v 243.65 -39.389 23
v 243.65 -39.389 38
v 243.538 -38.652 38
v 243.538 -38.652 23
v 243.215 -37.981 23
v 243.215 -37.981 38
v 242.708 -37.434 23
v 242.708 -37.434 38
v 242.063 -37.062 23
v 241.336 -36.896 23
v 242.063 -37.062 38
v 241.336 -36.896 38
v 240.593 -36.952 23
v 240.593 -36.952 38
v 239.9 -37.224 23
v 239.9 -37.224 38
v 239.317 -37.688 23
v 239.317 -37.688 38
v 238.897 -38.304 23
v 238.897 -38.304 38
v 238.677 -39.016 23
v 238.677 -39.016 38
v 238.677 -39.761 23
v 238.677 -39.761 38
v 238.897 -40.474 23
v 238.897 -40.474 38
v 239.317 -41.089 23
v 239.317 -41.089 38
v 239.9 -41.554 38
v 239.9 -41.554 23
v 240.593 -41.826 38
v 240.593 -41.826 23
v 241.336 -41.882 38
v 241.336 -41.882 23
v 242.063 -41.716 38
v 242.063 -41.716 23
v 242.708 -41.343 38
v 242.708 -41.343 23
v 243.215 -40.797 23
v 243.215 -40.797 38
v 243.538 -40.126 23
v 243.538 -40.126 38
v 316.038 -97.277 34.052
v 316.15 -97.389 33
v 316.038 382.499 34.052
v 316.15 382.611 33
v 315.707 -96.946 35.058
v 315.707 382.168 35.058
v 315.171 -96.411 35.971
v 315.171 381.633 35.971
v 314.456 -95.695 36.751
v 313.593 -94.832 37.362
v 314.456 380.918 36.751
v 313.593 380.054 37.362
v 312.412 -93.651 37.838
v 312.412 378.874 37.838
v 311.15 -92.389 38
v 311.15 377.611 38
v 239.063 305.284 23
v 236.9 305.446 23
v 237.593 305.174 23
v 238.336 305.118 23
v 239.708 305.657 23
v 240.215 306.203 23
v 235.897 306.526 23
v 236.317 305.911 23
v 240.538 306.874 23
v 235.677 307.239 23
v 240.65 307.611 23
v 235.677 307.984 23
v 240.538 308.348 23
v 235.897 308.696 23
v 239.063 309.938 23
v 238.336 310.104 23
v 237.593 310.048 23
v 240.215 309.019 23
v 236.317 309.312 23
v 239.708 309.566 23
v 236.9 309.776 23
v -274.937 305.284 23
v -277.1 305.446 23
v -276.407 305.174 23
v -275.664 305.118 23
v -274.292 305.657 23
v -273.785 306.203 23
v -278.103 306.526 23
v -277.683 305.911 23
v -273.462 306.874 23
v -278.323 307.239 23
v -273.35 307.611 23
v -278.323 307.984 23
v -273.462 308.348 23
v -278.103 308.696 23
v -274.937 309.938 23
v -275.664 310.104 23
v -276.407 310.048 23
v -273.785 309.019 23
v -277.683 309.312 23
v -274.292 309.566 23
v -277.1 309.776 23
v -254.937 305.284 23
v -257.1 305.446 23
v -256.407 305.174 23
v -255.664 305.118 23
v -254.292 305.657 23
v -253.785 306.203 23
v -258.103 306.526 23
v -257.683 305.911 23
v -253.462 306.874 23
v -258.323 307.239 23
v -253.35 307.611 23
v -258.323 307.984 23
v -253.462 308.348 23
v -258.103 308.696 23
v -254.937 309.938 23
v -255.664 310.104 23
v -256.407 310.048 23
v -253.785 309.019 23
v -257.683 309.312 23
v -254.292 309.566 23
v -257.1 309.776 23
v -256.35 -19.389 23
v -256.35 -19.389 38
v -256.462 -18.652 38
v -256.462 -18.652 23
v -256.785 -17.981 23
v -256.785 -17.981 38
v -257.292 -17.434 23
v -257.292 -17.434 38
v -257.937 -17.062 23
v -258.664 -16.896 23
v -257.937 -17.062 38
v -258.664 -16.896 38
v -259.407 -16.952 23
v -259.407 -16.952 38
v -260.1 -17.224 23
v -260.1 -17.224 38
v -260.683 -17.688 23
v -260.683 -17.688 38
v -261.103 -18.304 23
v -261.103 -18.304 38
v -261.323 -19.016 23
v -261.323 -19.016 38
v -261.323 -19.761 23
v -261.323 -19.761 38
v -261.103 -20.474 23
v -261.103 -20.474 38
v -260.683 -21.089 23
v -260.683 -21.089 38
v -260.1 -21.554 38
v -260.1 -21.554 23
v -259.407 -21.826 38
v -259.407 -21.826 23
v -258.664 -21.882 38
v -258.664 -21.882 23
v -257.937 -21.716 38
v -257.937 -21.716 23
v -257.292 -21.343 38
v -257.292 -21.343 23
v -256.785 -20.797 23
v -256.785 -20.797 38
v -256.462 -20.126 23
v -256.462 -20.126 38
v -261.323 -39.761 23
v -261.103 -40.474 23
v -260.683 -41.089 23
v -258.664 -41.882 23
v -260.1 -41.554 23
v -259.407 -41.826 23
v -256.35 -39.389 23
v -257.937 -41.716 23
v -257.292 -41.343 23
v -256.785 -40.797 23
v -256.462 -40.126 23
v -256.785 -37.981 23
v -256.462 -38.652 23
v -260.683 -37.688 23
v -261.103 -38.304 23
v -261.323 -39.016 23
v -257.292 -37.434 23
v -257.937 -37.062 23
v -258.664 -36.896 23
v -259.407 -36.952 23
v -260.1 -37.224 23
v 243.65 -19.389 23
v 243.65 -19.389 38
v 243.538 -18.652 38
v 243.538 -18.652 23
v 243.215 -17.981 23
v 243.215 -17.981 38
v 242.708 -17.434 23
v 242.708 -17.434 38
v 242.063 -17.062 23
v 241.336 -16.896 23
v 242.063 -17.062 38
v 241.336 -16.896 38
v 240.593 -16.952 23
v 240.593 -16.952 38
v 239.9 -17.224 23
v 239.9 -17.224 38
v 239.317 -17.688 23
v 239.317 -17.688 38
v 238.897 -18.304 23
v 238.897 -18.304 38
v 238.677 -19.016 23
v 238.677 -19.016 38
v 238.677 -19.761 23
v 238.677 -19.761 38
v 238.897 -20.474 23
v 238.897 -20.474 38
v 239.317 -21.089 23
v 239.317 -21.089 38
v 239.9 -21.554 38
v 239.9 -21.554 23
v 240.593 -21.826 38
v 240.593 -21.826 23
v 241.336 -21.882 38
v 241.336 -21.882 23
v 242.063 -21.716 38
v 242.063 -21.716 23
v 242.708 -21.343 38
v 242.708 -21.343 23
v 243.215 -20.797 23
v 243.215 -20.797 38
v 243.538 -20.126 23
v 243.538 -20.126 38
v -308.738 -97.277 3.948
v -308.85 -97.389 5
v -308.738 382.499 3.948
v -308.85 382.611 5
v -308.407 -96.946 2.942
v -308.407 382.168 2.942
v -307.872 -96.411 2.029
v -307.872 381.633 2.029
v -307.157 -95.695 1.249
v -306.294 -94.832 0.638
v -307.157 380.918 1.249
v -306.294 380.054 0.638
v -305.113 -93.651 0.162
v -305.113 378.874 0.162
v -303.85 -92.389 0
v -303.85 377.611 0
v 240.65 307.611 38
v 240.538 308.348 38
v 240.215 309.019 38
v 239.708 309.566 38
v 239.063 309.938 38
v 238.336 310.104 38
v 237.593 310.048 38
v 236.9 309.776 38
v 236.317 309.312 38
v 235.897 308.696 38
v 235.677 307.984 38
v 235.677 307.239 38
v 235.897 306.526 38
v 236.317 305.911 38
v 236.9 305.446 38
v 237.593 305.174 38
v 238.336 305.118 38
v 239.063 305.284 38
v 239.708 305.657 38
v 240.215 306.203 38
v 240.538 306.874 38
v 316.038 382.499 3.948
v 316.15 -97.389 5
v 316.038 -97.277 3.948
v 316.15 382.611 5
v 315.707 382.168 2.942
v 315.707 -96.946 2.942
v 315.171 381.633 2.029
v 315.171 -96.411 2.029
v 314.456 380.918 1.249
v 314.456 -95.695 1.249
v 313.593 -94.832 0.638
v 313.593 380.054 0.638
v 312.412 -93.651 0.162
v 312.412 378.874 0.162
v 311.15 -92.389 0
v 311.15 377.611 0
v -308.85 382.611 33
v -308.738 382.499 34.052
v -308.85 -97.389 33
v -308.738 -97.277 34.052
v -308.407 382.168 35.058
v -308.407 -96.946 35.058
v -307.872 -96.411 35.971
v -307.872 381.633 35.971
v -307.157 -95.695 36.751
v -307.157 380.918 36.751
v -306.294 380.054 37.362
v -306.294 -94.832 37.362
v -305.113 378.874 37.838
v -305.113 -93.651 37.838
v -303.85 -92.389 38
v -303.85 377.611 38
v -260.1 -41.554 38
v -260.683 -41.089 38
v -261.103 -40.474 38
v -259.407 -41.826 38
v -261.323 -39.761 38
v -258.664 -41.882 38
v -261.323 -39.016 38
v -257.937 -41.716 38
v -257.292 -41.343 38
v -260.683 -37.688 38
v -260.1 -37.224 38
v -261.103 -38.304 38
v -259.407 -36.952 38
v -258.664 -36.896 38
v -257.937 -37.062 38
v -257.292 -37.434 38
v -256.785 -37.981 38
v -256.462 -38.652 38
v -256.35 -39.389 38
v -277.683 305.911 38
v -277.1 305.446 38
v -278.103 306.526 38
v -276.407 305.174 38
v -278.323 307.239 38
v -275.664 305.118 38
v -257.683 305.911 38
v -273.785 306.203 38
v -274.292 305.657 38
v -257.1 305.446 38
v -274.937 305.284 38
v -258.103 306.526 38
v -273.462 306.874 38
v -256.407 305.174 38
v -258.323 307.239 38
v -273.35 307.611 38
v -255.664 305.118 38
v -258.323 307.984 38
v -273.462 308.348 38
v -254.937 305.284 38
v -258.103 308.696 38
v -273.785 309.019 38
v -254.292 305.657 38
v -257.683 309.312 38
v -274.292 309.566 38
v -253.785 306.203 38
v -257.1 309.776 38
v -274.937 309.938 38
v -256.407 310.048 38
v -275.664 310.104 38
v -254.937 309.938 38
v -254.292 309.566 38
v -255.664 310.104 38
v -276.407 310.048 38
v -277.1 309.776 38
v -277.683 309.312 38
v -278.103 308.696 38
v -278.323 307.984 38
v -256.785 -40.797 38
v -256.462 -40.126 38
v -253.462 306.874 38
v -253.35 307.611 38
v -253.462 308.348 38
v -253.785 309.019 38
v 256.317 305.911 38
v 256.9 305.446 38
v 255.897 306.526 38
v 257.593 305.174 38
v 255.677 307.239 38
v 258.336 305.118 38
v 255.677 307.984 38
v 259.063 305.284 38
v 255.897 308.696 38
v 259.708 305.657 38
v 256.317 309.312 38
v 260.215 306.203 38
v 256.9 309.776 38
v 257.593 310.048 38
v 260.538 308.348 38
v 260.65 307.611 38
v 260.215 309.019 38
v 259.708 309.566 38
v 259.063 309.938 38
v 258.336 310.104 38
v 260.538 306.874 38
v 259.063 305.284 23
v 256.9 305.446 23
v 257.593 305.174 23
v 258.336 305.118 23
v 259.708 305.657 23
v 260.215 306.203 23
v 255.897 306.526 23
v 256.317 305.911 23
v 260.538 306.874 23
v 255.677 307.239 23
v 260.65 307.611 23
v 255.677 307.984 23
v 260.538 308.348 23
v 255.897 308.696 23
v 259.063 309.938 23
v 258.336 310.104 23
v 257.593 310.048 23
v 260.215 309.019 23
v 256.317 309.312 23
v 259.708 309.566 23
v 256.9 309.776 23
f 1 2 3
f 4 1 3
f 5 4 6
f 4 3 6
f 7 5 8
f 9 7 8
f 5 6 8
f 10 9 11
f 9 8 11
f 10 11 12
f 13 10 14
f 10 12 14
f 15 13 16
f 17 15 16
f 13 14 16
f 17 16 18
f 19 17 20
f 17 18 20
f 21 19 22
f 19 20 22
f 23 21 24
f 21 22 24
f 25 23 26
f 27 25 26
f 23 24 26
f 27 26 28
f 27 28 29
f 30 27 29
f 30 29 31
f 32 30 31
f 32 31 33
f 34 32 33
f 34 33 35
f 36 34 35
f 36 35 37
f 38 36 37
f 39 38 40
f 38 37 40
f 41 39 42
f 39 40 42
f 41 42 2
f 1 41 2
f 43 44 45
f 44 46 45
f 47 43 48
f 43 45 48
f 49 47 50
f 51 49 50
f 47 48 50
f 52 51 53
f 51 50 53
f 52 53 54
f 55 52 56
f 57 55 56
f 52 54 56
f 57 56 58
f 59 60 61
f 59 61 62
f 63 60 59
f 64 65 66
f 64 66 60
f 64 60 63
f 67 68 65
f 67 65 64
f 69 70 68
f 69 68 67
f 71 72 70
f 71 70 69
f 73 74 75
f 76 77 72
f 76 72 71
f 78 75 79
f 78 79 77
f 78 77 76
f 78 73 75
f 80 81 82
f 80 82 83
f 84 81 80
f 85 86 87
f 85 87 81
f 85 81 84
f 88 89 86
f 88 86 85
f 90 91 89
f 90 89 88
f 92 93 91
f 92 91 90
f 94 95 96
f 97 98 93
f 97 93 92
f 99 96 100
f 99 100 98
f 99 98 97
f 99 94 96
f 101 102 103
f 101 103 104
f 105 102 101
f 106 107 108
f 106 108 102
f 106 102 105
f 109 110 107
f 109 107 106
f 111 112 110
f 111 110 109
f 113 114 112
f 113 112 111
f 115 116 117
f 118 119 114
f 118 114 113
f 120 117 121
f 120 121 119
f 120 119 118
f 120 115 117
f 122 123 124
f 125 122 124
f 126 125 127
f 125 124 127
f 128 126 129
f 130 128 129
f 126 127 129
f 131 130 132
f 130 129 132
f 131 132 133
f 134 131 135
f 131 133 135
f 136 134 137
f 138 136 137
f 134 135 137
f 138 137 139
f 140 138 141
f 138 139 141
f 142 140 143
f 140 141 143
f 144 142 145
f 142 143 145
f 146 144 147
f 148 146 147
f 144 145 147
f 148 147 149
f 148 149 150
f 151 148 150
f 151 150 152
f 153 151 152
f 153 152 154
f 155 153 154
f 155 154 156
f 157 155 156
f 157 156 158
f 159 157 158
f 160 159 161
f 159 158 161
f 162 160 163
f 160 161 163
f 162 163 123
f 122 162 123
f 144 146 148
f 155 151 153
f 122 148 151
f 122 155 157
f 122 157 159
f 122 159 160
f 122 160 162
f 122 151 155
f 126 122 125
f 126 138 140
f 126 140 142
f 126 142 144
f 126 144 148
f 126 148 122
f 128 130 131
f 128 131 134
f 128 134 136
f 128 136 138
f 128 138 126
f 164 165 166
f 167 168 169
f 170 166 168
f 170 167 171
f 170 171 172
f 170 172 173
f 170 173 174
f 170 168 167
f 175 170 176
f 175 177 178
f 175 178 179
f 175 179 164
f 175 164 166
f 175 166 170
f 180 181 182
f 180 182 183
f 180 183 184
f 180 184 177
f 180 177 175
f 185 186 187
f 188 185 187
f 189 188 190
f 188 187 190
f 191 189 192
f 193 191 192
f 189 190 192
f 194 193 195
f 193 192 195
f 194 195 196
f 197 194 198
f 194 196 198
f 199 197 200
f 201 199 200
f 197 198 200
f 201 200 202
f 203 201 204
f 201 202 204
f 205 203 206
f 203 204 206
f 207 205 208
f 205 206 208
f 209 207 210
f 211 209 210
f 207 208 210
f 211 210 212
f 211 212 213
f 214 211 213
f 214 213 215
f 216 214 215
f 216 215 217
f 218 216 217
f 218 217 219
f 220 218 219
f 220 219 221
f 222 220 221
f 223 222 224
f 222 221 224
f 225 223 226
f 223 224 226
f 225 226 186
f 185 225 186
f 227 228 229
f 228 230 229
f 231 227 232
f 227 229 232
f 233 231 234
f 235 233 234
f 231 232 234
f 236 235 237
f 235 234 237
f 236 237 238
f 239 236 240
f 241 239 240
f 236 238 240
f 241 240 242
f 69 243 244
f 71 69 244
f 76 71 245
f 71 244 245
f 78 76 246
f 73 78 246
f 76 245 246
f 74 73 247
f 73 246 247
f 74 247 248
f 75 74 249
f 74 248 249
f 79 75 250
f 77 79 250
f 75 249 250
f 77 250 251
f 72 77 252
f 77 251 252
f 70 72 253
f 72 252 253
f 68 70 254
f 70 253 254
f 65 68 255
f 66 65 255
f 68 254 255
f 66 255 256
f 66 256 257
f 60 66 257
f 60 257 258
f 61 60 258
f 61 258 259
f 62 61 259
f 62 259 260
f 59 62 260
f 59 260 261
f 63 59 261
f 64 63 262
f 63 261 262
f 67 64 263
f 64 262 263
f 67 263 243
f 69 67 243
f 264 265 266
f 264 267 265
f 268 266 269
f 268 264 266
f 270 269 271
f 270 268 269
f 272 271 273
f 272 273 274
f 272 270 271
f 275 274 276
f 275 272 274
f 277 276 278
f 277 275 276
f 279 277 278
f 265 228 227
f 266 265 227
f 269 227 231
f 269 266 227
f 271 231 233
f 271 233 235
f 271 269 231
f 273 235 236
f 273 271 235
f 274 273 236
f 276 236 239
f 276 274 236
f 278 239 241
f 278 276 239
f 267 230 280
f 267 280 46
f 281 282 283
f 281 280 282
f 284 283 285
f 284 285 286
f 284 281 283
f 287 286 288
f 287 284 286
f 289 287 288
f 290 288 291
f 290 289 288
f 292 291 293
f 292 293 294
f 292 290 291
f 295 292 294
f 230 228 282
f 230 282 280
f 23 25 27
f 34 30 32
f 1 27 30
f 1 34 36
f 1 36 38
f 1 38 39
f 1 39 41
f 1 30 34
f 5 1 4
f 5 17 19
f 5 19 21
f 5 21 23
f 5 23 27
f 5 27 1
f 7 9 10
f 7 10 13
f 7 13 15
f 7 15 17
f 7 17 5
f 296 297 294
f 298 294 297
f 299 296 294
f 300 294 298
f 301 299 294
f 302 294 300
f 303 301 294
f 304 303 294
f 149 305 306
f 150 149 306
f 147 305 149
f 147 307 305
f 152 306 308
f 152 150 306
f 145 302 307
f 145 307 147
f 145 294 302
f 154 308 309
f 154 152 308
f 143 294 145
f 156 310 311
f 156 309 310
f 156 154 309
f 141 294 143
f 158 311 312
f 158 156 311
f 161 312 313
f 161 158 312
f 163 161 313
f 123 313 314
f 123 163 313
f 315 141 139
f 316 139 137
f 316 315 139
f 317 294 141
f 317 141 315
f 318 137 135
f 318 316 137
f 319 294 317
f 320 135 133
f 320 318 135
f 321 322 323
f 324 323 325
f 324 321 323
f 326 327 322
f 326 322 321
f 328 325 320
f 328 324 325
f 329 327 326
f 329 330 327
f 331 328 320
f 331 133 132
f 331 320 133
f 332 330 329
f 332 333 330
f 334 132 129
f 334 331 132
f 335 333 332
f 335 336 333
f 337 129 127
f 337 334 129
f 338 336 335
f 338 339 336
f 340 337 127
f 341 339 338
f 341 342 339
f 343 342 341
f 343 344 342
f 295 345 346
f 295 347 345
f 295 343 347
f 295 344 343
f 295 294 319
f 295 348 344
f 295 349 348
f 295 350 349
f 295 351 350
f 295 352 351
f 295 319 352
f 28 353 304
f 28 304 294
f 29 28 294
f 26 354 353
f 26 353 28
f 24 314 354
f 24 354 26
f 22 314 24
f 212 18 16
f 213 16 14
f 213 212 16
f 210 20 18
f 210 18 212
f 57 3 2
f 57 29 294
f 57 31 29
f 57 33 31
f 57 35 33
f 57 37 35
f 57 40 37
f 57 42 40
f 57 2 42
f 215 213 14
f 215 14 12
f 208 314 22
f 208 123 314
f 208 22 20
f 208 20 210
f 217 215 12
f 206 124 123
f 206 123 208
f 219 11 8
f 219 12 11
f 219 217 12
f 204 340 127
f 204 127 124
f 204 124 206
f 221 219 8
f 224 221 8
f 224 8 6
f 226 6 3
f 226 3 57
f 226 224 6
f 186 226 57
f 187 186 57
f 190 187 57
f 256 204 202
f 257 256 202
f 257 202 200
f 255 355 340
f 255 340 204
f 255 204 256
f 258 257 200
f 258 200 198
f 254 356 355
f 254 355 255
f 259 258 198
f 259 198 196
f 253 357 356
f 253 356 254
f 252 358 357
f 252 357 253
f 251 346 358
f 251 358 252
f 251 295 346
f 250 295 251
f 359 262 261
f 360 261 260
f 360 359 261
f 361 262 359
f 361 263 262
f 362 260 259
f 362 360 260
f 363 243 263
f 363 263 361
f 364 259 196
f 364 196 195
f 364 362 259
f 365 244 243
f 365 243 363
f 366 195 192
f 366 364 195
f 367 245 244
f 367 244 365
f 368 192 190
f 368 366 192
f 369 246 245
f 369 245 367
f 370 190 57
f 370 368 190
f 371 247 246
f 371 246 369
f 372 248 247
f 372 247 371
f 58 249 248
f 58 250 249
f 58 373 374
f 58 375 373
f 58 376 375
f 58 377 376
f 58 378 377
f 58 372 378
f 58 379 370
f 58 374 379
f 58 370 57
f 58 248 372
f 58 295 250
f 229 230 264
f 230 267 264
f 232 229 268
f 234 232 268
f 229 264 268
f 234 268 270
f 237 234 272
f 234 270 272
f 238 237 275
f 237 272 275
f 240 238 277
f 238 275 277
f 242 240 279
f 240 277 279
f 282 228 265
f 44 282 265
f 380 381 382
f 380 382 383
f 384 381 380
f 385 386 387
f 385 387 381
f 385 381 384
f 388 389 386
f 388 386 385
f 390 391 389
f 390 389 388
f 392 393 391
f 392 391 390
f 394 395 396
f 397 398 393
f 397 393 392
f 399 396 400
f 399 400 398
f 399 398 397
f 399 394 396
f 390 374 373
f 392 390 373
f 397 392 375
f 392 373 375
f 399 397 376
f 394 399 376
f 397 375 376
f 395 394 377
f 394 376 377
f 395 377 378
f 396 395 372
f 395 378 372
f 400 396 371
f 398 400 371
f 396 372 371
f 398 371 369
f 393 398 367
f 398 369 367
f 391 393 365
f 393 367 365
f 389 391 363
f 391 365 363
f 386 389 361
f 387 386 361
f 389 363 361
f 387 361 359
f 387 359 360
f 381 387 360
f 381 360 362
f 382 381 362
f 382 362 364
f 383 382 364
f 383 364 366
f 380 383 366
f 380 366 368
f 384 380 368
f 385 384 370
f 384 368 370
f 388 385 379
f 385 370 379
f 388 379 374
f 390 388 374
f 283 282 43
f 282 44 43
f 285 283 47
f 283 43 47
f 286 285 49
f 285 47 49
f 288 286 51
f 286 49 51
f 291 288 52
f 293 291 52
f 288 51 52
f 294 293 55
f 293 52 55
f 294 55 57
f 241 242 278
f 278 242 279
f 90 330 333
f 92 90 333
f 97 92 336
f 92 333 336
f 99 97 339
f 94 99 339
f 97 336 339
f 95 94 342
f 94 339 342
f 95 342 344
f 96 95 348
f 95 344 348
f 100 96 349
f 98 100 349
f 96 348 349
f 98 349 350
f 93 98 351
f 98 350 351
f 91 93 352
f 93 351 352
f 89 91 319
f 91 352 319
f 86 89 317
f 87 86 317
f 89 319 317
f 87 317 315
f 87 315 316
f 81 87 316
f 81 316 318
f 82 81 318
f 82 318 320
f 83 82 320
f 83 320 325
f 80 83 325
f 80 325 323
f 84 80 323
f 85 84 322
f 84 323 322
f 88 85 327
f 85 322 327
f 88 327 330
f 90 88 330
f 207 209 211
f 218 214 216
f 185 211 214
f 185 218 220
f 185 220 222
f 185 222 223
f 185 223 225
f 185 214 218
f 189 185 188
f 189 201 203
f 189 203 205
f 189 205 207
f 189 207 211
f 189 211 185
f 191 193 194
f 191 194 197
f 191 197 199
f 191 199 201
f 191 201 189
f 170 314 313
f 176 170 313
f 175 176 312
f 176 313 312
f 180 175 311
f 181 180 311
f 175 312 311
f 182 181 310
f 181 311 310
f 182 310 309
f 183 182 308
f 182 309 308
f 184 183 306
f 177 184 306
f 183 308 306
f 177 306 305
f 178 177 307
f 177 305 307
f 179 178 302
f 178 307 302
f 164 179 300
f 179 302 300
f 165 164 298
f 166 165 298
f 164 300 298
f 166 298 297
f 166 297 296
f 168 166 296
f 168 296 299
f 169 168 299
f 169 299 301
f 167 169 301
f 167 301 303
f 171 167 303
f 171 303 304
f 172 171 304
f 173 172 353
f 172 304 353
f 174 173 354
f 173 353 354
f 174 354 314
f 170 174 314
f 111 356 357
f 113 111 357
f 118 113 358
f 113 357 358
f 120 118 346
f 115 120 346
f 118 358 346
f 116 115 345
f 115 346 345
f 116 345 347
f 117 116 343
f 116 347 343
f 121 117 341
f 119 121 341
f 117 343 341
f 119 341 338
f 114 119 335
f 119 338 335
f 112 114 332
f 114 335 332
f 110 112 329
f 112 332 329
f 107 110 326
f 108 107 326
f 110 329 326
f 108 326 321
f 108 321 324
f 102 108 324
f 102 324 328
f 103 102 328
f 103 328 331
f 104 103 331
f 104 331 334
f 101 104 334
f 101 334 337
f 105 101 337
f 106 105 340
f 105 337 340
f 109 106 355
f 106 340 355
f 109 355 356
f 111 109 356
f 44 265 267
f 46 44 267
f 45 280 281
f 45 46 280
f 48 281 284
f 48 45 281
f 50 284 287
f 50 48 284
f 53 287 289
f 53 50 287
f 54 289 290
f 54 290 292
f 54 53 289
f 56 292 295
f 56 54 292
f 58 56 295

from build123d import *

# Parameters (mm, degrees)
F0_W     = 625
F0_H     = 480
F1_DEPTH = 38
F2_R     = 5
F3_R     = 2.5
F4_DEPTH = 15


with BuildPart() as f1:
    # F0 (on Top) → F1 (new body)
    with BuildSketch(Plane.XY):
        with Locations((3.649522, 142.611136)):
            Rectangle(F0_W, F0_H)
    extrude(amount=F1_DEPTH)

    # F2
    f2_edges = [f1.edges().sort_by_distance(p)[0] for p in [
        (316.149522, 142.611136, 38),
        (3.649522, 382.611136, 38),
        (-308.850478, 142.611136, 38),
        (3.649522, -97.388864, 38),
        (316.149522, 142.611136, 0),
        (3.649522, 382.611136, 0),
        (-308.850478, 142.611136, 0),
        (3.649522, -97.388864, 0),
    ]]
    fillet(f2_edges, radius=F2_R)

    # F3 (on face) → F4 (cut)
    with BuildSketch(Plane.XY.offset(38)):
        with Locations((-275.850478, 307.611136)):
            Circle(F3_R)
        with Locations((-255.850478, 307.611136)):
            Circle(F3_R)
        with Locations((-258.850478, -39.388864)):
            Circle(F3_R)
        with Locations((-258.850478, -19.388864)):
            Circle(F3_R)
        with Locations((238.149522, 307.611136)):
            Circle(F3_R)
        with Locations((258.149522, 307.611136)):
            Circle(F3_R)
        with Locations((241.149522, -19.388864)):
            Circle(F3_R)
        with Locations((241.149522, -39.388864)):
            Circle(F3_R)
    extrude(amount=-F4_DEPTH, mode=Mode.SUBTRACT)


solid = f1.part
